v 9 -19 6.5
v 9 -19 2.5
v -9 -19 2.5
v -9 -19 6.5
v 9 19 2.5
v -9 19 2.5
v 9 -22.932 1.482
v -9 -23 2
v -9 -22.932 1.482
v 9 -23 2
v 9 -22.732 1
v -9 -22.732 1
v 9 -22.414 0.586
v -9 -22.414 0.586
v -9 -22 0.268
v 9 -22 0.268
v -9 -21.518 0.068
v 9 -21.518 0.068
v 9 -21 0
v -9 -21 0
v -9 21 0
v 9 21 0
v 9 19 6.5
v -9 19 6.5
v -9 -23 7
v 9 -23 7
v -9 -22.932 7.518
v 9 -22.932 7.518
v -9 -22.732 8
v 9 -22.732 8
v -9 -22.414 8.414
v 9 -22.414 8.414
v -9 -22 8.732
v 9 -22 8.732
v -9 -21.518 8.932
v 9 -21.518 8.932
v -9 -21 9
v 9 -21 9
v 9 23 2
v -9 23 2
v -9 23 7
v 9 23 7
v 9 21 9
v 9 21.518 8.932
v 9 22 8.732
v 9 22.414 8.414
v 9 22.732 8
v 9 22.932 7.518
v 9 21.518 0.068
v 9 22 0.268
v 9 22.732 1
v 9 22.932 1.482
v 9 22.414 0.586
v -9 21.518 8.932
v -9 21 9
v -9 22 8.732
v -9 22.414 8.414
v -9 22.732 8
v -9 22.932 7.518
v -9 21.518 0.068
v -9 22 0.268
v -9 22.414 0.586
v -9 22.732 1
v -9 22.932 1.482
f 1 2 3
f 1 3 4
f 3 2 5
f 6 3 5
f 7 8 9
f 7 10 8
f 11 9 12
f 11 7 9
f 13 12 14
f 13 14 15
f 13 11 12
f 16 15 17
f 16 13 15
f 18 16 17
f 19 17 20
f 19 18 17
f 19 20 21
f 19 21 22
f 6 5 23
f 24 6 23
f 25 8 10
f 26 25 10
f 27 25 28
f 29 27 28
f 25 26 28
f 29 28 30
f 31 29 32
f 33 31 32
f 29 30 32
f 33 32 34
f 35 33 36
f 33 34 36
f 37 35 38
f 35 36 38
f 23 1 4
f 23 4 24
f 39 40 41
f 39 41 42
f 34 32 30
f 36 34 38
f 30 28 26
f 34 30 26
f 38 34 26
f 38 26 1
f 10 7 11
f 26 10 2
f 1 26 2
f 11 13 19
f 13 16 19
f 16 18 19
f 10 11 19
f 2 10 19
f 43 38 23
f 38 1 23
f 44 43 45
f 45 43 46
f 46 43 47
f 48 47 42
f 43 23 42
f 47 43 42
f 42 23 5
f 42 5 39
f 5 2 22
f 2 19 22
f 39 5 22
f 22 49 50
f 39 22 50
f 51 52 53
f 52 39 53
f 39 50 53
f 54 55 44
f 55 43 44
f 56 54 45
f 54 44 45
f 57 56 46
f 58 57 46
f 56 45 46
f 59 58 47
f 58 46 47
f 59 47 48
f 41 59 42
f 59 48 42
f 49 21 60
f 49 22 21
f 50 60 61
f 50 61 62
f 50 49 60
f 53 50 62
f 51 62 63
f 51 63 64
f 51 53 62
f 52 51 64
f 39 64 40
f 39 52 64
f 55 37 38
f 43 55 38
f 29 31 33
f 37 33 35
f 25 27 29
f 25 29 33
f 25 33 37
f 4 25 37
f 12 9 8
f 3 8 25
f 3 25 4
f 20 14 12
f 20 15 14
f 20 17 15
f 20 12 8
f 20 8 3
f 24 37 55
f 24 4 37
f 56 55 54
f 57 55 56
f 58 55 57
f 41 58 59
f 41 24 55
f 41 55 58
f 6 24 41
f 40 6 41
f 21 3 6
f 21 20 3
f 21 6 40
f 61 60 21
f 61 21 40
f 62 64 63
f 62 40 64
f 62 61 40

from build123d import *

# Parameters (mm, degrees)
F0_W     = 18
F0_H     = 46
F1_DEPTH = 9
F2_W     = 38
F2_H     = 4
F3_DEPTH = 18.001
F4_R     = 2


with BuildPart() as f1:
    # F0 (on Top) → F1 (new body)
    with BuildSketch(Plane.XY):
        Rectangle(F0_W, F0_H)
    extrude(amount=F1_DEPTH)

    # F2 (on face) → F3 (cut, through all)
    with BuildSketch(Plane.YZ.offset(9)):
        with Locations((0, 4.5)):
            Rectangle(F2_W, F2_H)
    extrude(amount=-F3_DEPTH, mode=Mode.SUBTRACT)

    # F4
    f4_edges = [f1.edges().sort_by_distance(p)[0] for p in [
        (0, -23, 9),
        (0, -23, 0),
        (0, 23, 9),
        (0, 23, 0),
    ]]
    fillet(f4_edges, radius=F4_R)


solid = f1.part
